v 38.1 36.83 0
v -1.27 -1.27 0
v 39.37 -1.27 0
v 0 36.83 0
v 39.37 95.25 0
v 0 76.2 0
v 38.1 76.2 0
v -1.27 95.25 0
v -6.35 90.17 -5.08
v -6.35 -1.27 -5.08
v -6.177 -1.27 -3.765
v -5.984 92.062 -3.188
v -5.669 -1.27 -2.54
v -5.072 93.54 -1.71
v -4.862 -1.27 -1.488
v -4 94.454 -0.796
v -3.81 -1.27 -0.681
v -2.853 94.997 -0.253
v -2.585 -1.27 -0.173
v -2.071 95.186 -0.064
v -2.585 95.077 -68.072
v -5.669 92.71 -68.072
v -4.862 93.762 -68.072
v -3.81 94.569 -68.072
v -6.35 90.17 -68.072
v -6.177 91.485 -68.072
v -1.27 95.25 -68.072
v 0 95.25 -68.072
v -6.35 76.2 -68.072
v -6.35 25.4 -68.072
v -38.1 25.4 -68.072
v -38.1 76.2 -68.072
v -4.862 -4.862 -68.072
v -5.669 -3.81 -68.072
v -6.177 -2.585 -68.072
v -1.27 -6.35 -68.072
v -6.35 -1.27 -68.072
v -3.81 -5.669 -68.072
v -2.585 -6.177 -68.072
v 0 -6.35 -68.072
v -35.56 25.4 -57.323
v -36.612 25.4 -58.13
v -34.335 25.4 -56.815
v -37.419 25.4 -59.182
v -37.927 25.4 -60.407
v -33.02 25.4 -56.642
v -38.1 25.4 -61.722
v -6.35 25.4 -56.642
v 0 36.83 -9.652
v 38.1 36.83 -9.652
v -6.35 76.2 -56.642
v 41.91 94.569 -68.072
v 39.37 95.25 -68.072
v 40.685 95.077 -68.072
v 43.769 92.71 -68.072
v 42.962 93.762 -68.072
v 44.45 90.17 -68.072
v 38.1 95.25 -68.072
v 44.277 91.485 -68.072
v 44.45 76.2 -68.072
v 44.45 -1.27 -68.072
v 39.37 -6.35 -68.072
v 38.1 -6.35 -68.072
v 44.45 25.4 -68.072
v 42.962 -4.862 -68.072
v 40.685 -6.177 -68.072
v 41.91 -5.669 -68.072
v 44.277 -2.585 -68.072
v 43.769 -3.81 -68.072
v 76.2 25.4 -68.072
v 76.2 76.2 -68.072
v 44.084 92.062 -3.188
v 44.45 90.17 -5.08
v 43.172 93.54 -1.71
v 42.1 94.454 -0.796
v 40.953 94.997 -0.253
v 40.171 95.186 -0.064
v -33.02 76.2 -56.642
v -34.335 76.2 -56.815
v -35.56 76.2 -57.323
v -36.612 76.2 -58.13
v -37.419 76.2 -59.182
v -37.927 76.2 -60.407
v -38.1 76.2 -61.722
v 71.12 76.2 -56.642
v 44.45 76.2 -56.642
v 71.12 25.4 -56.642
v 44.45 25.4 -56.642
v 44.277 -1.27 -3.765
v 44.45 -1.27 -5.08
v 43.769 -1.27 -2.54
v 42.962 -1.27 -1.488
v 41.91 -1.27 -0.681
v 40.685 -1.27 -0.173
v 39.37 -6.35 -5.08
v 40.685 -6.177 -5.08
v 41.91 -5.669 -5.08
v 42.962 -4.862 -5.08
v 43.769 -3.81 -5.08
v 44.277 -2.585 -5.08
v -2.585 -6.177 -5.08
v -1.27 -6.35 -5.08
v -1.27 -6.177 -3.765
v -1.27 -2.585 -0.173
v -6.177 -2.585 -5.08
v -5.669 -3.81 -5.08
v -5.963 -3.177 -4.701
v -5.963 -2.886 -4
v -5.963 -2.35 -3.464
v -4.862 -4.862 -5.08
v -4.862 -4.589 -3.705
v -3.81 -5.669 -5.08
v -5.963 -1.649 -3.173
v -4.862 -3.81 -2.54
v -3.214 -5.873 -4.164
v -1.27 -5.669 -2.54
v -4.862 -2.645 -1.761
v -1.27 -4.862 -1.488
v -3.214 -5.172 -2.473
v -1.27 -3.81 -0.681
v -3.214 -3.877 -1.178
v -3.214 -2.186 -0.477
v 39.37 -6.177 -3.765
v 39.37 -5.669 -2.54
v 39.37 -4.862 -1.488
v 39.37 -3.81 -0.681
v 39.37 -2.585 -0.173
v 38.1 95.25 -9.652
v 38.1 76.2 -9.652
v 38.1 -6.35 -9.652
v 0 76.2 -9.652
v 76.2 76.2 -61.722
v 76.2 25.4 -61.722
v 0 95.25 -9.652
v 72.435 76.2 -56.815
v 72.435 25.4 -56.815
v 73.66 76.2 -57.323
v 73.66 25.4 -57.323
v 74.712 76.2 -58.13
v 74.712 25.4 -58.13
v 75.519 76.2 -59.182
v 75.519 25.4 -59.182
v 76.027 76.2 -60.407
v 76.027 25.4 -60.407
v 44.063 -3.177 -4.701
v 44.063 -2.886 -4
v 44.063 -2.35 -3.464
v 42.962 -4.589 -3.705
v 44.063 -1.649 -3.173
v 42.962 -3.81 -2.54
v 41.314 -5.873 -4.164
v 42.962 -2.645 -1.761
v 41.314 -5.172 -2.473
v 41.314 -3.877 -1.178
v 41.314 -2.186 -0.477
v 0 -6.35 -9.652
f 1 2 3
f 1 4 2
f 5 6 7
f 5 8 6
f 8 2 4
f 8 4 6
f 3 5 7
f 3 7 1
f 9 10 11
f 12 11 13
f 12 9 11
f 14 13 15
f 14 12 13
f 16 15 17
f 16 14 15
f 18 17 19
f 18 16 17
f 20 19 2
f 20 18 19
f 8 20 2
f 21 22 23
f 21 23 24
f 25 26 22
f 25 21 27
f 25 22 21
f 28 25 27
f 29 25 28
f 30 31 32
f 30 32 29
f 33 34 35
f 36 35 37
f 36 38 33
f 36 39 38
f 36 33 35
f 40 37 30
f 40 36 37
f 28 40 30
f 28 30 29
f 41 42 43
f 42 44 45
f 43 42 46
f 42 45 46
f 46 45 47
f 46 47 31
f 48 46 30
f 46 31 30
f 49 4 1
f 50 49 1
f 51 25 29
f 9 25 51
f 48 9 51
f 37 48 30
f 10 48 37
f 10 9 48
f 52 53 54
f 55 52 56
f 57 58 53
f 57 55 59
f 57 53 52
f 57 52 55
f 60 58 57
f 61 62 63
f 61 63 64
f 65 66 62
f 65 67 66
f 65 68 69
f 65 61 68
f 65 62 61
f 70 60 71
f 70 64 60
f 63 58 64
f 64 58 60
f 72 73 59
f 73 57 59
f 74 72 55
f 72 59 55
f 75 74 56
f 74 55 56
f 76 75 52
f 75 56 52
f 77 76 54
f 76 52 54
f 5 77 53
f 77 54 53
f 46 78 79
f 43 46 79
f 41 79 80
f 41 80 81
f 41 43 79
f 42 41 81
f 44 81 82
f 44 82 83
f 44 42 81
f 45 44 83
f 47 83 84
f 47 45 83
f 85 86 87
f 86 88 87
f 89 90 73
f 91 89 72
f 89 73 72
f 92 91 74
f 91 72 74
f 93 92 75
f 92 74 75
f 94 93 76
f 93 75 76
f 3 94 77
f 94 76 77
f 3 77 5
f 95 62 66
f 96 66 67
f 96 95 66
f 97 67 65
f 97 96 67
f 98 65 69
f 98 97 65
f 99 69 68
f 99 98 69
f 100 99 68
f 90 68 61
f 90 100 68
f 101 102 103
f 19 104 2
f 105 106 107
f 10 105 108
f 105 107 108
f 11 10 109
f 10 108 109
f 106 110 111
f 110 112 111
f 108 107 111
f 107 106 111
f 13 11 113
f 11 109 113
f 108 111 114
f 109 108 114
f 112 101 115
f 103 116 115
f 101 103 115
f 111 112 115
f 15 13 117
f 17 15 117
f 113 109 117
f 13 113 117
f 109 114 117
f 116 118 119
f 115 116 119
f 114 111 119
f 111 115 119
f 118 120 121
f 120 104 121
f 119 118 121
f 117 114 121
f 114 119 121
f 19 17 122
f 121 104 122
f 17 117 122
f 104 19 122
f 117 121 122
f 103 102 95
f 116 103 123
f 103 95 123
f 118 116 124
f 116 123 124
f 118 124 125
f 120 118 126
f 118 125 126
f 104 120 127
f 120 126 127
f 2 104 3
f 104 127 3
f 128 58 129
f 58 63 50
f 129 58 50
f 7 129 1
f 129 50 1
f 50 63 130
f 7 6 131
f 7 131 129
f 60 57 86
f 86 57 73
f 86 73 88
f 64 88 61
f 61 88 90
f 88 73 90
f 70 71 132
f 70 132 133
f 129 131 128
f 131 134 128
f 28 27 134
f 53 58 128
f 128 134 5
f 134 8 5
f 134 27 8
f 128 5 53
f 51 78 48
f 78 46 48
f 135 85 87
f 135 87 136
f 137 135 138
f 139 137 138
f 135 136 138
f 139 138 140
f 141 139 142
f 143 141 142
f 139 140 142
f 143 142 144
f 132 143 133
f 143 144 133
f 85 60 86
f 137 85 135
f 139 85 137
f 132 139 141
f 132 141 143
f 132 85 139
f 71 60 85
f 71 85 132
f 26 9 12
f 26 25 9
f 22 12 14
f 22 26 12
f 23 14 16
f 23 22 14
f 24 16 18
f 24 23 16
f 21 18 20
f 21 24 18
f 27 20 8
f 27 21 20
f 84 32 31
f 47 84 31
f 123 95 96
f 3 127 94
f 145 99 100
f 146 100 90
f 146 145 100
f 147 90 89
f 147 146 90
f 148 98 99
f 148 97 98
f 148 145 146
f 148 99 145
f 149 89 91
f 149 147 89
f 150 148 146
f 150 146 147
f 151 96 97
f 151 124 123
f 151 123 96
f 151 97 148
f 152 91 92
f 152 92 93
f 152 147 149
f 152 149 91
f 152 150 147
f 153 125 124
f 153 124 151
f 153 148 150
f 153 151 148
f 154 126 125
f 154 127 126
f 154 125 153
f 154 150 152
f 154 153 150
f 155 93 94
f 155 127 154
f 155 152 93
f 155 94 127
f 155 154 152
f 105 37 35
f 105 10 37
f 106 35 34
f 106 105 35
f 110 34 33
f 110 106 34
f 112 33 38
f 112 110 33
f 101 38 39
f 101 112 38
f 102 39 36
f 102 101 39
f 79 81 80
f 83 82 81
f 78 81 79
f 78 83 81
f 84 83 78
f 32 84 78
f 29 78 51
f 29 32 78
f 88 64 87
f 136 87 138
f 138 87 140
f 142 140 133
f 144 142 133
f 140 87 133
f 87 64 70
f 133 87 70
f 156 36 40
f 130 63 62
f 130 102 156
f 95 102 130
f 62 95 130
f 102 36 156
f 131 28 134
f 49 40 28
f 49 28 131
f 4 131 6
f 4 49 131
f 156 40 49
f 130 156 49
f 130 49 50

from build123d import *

# Parameters (mm, degrees)
F0_W     = 50.8
F0_H     = 101.6
F0_W_2   = 38.1
F0_H_2   = 12.7
F0_H_3   = 36.83
F1_DEPTH = 9.652
F2_W     = 50.8
F2_H     = 101.6
F3_DEPTH = 58.42
F4_W     = 31.75
F4_H     = 50.8
F5_DEPTH = 11.43
F6_R     = 5.08
F7_W     = 38.1
F7_H     = 58.42
F8_DEPTH = 101.601
F9_R     = 5.08


with BuildPart() as f1:
    # F0 (on Top) → F1 (new body)
    with BuildSketch(Plane.XY):
        with Locations((19.05, 44.45)):
            Rectangle(F0_W, F0_H)
        Polygon((38.1, 0), (0, 0), (0, 36.83), (0, 76.2), (0, 88.9), (38.1, 88.9), (38.1, 76.2), (38.1, 36.83), align=None, mode=Mode.SUBTRACT)
        with Locations((19.05, 82.55)):
            Rectangle(F0_W_2, F0_H_2)
        with Locations((19.05, 18.415)):
            Rectangle(F0_W_2, F0_H_3)
    extrude(amount=-F1_DEPTH)

    # F2 (on face) → F3 (join)
    with BuildSketch(Plane(origin=(0, 0, -9.652), x_dir=(1, 0, 0), z_dir=(0, 0, -1))):
        with Locations((19.05, -44.45)):
            Rectangle(F2_W, F2_H)
        Polygon((0, -36.83), (0, 0), (38.1, 0), (38.1, -36.83), (38.1, -76.2), (38.1, -88.9), (0, -88.9), (0, -76.2), align=None, mode=Mode.SUBTRACT)
    extrude(amount=F3_DEPTH)

    # F4 (on face) → F5 (join)
    with BuildSketch(Plane(origin=(0, 0, -68.072), x_dir=(1, 0, 0), z_dir=(0, 0, -1))):
        with Locations((60.325, -50.8)):
            Rectangle(F4_W, F4_H)
        with Locations((-22.225, -50.8)):
            Rectangle(F4_W, F4_H)
    extrude(amount=-F5_DEPTH)

    # F6
    f6_edges = [f1.edges().sort_by_distance(p)[0] for p in [
        (-38.1, 50.8, -56.642),
        (76.2, 50.8, -56.642),
    ]]
    fillet(f6_edges, radius=F6_R)

    # F7 (on face) → F8 (cut, through all)
    with BuildSketch(Plane.XZ.offset(6.35)):
        with Locations((19.05, -38.862)):
            Rectangle(F7_W, F7_H)
    extrude(amount=-F8_DEPTH, mode=Mode.SUBTRACT)

    # F9
    f9_edges = [f1.edges().sort_by_distance(p)[0] for p in [
        (19.05, -6.35, 0),
        (44.45, -6.35, -34.036),
        (-6.35, -6.35, -34.036),
        (44.45, 44.45, 0),
        (-6.35, 44.45, 0),
        (44.45, 95.25, -34.036),
        (-6.35, 95.25, -34.036),
    ]]
    fillet(f9_edges, radius=F9_R)


solid = f1.part
